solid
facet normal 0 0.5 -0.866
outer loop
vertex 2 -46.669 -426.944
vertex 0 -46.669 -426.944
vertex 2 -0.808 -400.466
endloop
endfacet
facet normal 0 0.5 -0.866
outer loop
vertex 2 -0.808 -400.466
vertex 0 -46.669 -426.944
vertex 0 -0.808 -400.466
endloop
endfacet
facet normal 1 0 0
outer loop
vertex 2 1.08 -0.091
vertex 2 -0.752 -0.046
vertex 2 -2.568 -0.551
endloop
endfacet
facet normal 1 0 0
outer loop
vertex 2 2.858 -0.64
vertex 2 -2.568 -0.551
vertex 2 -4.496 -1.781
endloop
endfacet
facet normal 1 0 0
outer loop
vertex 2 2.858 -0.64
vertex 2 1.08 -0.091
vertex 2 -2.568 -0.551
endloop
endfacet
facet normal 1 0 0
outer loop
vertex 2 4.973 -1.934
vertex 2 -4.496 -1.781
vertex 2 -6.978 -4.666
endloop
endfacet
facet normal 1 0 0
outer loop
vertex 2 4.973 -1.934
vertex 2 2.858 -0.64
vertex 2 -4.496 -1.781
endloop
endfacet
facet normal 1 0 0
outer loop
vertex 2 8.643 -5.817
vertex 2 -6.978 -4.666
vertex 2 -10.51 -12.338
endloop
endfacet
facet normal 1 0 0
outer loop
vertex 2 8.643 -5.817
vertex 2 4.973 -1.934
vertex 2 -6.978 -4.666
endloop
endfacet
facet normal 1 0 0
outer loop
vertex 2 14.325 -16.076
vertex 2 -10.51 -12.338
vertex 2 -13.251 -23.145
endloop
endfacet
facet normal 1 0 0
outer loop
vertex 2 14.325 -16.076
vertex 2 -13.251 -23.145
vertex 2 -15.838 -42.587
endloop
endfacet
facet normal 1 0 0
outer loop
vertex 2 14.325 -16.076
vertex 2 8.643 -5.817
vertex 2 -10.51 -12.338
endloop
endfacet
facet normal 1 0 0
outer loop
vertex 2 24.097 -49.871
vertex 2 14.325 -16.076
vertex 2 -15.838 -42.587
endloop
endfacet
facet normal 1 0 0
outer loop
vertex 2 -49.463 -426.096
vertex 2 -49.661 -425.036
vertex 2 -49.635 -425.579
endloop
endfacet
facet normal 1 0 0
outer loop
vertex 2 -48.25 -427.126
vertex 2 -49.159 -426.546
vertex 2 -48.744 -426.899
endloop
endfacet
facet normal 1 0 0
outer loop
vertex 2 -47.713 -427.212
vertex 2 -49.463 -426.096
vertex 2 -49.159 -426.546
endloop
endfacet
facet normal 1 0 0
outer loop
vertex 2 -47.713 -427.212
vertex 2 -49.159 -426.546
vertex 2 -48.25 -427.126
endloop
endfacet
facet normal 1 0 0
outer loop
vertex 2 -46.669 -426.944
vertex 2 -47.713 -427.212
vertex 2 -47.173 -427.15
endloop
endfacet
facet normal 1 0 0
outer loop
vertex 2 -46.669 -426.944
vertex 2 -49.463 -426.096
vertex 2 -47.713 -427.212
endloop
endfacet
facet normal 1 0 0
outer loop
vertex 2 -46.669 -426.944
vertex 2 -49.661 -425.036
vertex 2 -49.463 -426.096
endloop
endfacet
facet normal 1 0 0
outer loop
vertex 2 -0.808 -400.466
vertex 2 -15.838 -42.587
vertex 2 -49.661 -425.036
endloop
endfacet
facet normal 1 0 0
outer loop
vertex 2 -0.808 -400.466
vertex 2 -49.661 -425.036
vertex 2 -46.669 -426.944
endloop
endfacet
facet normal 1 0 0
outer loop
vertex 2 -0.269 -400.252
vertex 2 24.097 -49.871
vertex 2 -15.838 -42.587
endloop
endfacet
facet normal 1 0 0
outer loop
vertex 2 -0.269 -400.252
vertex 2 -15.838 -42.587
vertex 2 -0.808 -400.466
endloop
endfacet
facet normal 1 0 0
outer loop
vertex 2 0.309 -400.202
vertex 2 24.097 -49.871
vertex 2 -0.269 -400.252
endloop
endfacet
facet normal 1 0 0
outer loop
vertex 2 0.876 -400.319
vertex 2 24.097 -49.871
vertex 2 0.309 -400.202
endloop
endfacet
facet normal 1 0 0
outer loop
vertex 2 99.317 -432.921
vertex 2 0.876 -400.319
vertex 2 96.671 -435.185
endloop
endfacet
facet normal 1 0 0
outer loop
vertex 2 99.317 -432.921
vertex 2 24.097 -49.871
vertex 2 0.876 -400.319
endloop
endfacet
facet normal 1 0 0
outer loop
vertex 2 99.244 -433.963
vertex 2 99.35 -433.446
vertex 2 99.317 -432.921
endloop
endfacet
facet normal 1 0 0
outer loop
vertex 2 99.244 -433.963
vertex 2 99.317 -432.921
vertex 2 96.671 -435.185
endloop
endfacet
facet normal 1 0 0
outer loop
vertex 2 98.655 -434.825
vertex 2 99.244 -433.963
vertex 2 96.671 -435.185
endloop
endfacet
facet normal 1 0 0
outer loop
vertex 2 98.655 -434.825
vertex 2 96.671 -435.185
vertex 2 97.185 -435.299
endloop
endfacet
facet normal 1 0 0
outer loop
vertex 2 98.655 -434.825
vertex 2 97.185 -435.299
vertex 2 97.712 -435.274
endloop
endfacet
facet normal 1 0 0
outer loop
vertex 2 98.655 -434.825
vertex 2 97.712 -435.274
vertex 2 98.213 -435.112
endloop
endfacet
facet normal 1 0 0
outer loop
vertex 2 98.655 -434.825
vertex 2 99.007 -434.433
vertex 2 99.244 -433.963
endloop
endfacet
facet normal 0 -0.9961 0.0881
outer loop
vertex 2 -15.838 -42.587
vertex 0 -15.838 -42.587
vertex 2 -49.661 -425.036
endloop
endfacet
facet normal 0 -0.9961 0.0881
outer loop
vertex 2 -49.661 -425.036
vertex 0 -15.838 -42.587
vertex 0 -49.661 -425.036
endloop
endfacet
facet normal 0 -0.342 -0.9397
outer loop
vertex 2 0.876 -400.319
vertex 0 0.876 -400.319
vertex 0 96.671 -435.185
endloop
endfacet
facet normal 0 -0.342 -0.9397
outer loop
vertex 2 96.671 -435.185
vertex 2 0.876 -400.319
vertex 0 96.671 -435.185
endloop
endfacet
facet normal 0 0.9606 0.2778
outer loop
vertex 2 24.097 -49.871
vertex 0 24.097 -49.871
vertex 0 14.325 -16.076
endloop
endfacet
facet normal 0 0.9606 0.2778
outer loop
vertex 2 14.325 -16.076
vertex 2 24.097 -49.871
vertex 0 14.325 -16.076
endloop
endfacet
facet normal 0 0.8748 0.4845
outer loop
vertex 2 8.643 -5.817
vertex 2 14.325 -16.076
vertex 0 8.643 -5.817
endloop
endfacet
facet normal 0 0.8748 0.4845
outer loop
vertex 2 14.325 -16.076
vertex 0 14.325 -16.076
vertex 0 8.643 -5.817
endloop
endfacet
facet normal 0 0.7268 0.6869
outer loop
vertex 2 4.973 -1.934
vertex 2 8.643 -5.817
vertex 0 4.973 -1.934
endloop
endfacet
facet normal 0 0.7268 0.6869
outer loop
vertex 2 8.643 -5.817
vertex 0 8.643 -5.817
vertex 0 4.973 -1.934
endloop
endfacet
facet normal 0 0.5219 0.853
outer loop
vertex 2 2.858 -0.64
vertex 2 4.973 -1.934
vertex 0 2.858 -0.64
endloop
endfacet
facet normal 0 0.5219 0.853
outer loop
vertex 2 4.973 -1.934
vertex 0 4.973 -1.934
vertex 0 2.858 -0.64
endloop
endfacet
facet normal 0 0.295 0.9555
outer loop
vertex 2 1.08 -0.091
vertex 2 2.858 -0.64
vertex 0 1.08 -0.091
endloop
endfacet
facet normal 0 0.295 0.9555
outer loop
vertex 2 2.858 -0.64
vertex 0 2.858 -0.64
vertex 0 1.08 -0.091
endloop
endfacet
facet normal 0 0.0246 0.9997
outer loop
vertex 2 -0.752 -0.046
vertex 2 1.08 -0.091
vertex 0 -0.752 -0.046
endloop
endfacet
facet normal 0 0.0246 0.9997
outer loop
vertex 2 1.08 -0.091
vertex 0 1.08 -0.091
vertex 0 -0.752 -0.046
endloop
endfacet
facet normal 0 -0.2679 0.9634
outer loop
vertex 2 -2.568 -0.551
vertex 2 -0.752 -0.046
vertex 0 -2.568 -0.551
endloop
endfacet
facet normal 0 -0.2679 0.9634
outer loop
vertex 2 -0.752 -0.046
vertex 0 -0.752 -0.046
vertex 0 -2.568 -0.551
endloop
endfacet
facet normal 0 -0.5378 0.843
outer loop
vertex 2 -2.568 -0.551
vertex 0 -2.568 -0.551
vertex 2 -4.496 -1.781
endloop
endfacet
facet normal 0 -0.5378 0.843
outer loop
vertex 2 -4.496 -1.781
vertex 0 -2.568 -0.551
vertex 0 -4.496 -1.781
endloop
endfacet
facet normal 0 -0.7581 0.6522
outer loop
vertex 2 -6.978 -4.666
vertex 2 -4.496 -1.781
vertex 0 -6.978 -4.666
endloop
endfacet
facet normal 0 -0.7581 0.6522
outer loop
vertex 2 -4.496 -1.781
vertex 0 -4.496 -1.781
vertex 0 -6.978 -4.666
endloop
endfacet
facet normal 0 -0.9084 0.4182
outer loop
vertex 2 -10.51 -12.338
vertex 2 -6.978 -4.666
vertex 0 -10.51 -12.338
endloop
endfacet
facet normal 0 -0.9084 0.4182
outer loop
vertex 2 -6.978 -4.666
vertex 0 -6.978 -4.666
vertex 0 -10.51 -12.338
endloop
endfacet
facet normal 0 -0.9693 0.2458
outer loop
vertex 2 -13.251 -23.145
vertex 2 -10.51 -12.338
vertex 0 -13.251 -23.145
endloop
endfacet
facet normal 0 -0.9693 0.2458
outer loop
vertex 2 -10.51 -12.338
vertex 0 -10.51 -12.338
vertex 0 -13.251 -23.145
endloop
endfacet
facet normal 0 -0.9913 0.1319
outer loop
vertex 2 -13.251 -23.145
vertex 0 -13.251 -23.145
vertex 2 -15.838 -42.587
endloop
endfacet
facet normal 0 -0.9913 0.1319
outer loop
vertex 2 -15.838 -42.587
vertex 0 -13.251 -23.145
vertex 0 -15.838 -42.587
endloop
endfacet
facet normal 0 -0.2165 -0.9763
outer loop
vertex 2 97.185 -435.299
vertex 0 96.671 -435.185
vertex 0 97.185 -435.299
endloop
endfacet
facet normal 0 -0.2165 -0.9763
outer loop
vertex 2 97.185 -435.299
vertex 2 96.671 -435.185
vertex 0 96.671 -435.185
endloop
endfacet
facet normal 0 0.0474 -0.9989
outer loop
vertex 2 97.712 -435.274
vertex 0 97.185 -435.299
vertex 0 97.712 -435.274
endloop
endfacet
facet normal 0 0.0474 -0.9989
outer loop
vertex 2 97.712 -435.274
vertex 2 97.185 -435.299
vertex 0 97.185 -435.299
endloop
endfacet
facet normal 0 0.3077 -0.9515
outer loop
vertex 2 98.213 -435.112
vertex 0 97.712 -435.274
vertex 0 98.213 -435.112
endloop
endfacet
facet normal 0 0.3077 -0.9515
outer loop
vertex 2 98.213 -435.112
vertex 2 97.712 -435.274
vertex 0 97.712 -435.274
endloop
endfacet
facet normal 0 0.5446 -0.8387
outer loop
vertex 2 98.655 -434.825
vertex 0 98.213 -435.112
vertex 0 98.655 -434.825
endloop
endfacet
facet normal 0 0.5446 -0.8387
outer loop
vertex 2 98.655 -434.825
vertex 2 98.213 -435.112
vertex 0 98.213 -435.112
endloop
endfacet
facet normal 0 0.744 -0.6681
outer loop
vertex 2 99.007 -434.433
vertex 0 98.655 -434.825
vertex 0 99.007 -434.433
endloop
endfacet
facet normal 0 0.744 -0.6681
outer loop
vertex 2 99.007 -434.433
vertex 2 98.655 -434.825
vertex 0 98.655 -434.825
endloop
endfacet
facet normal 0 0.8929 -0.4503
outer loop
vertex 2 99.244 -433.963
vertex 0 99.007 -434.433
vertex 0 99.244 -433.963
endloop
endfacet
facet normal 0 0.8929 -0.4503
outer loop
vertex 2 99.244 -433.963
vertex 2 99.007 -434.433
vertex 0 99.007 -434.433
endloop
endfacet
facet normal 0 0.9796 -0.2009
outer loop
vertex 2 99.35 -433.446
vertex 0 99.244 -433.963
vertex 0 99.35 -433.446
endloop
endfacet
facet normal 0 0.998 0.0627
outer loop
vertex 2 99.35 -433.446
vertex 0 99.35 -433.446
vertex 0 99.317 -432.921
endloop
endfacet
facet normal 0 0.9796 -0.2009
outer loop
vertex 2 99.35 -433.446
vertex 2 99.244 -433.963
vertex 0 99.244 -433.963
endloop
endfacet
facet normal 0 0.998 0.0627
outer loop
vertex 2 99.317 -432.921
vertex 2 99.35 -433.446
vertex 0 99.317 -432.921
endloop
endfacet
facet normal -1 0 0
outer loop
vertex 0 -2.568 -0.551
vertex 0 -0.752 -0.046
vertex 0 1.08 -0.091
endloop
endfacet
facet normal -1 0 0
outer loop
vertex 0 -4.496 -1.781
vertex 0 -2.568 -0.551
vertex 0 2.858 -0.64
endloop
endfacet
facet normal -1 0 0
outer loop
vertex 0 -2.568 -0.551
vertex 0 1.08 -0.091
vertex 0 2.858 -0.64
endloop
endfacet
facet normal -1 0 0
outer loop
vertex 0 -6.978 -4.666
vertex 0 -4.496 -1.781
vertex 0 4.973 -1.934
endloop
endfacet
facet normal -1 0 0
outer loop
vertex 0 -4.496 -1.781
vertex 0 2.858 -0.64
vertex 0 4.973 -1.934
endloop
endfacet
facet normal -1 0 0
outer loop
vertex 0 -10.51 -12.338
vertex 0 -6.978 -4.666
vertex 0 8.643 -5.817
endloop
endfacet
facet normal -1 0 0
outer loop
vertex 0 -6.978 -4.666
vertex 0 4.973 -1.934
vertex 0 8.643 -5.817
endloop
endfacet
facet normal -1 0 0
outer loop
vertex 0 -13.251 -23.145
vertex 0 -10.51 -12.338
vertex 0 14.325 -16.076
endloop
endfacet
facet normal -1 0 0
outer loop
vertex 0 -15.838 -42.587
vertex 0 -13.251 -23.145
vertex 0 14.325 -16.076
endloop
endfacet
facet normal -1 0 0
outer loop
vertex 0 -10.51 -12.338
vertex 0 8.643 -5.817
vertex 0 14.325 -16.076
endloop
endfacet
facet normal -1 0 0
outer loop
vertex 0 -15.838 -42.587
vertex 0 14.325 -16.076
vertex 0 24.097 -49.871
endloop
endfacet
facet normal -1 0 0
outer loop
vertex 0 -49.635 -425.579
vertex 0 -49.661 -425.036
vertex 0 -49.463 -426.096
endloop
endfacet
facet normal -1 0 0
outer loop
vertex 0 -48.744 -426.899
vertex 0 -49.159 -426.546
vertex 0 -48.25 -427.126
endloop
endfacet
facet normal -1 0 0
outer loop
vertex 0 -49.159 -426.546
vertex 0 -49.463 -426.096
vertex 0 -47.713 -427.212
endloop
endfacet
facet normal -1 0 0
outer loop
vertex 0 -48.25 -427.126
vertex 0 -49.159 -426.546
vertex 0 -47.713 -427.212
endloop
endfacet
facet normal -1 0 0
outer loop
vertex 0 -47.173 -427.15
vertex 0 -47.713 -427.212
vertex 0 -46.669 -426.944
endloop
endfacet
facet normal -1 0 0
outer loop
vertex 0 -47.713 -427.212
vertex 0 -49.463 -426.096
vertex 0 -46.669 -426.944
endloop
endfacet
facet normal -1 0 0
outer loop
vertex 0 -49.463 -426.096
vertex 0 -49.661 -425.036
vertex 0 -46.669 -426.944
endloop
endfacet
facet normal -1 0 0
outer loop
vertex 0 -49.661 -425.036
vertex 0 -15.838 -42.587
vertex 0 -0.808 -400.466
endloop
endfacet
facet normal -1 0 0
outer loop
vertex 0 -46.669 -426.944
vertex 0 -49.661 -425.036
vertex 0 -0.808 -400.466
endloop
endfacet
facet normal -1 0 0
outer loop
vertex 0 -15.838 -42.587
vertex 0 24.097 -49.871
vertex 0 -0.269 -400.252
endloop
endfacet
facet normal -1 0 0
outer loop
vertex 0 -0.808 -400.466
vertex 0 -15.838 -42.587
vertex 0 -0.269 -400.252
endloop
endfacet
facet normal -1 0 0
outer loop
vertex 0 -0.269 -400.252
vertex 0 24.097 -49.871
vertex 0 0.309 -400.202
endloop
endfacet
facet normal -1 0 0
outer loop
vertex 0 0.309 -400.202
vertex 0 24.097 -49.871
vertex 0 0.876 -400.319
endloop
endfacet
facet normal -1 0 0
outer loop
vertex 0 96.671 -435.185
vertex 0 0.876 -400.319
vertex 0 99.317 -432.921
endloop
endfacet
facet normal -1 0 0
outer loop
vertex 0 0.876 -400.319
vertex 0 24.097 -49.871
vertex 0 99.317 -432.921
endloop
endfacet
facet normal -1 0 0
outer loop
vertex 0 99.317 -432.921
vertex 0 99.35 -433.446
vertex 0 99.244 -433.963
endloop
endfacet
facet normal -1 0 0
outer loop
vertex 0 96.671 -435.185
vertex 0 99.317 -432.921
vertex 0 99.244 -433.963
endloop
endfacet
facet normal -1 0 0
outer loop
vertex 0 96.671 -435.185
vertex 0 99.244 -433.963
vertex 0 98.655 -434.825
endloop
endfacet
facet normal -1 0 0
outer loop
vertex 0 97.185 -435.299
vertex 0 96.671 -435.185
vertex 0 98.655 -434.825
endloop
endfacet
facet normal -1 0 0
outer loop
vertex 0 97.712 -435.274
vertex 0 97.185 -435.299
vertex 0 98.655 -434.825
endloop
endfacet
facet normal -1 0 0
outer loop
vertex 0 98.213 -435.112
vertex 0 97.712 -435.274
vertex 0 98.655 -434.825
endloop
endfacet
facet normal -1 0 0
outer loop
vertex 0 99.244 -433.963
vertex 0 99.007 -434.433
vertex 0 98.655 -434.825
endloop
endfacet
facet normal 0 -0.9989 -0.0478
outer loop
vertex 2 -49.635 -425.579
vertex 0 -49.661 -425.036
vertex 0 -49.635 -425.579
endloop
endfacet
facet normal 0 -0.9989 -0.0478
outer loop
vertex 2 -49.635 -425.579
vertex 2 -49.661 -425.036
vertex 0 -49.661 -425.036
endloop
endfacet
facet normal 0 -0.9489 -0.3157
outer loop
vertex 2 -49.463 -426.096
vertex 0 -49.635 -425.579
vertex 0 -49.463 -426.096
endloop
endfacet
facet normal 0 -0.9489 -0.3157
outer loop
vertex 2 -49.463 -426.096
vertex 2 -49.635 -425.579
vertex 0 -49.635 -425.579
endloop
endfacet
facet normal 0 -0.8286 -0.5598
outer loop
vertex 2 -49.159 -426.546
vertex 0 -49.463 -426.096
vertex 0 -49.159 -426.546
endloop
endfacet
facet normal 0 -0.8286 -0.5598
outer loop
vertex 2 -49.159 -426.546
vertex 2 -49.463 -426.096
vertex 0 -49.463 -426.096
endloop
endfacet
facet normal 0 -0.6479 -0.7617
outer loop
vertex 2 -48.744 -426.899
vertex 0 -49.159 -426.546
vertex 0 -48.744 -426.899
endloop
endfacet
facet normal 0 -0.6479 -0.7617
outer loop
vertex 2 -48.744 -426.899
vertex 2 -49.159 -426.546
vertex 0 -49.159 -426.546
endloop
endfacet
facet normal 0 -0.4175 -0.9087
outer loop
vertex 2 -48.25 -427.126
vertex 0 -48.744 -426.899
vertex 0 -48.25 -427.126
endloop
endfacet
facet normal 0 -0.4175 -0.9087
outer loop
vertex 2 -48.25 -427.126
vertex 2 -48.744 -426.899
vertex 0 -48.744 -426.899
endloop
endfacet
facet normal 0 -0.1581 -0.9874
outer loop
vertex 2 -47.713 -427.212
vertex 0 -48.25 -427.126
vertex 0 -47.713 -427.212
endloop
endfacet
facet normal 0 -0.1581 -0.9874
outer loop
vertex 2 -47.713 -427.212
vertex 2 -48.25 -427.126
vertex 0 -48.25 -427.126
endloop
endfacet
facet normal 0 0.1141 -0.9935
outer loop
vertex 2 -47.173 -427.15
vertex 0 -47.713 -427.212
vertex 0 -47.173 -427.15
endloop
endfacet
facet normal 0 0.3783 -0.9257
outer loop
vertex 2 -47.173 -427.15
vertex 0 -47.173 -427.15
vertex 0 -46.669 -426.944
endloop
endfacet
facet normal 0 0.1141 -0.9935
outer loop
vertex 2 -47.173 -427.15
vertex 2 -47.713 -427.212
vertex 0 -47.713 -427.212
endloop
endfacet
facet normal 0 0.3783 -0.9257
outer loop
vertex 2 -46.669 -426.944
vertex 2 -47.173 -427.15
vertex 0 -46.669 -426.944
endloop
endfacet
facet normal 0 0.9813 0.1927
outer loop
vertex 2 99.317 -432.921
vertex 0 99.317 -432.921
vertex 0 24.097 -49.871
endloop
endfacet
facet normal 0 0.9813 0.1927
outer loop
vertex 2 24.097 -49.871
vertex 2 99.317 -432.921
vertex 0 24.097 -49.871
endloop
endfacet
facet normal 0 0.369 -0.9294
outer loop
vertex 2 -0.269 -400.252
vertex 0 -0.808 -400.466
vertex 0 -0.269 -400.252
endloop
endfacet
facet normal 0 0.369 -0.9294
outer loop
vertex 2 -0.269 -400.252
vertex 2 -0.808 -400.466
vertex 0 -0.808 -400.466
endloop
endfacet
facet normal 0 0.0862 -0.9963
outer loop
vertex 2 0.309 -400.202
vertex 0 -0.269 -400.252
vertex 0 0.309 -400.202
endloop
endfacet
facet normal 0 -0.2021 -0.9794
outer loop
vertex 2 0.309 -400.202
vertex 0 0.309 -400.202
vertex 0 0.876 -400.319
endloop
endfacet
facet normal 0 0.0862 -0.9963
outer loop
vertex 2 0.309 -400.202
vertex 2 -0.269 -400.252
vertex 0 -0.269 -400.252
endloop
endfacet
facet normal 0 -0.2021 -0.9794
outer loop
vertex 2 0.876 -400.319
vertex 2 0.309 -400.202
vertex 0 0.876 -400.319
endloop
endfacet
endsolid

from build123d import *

# Parameters (mm, degrees)
BOSS_EXTRUDE1_DEPTH = 2
FILLET1_R           = 2


with BuildPart() as part:
    # Sketch1 → Boss-Extrude1 (new body)
    with BuildSketch(Plane(origin=(0, 0, 0), x_dir=(0, 0, -1), z_dir=(1, 0, 0))):
        with BuildLine():
            Line((42.586839917, -15.837760008), (428.867513459, -50))
            Line((428.867513459, -50), (400, 0))
            Line((400, 0), (436.397023427, 100))
            Line((436.397023427, 100), (49.871439173, 24.096806654))
            add(Edge.make_bspline(
                [(49.871439173, 24.096806654), (48.681752932, 23.863184383), (44.814068289, 23.077011878), (38.505797722, 21.642904741), (31.201466363, 19.698317647), (24.613699512, 17.645994765), (18.76724164, 15.508150537), (13.683550401, 13.304700679), (9.37800282, 11.055816822), (5.861297917, 8.777228884), (3.138322997, 6.477199452), (1.210129987, 4.152231688), (0.097811757, 1.772938442), (-0.114930505, -0.636761689), (0.57766434, -2.953143262), (2.135848355, -5.061068321), (4.469445072, -6.959713819), (7.560040923, -8.686755926), (11.401944067, -10.2560624), (15.986032112, -11.671139402), (21.296971451, -12.930258423), (27.314276935, -14.032627661), (34.014034124, -14.976251159), (39.18417279, -15.529555506), (42.114321875, -15.795971029), (42.586839917, -15.837760008)],
                knots=[0.432080365, 0.432080365, 0.432080365, 0.432080365, 0.436534668, 0.446580264, 0.455844073, 0.464299076, 0.471923139, 0.478704818, 0.48464194, 0.489750398, 0.49407133, 0.497690549, 0.500769141, 0.503574039, 0.506378403, 0.509454075, 0.513061791, 0.51735579, 0.522417512, 0.528283214, 0.534965479, 0.542459995, 0.550751382, 0.559818255, 0.561561054, 0.561561054, 0.561561054, 0.561561054], degree=3))
        make_face()
    extrude(amount=BOSS_EXTRUDE1_DEPTH)

    # Fillet1
    fillet1_edges = [part.edges().sort_by_distance(p)[0] for p in [
        (1, 100, -436.397023427),
        (1, 0, -400),
        (1, -50, -428.867513459),
    ]]
    fillet(fillet1_edges, radius=FILLET1_R)


solid = part.part
